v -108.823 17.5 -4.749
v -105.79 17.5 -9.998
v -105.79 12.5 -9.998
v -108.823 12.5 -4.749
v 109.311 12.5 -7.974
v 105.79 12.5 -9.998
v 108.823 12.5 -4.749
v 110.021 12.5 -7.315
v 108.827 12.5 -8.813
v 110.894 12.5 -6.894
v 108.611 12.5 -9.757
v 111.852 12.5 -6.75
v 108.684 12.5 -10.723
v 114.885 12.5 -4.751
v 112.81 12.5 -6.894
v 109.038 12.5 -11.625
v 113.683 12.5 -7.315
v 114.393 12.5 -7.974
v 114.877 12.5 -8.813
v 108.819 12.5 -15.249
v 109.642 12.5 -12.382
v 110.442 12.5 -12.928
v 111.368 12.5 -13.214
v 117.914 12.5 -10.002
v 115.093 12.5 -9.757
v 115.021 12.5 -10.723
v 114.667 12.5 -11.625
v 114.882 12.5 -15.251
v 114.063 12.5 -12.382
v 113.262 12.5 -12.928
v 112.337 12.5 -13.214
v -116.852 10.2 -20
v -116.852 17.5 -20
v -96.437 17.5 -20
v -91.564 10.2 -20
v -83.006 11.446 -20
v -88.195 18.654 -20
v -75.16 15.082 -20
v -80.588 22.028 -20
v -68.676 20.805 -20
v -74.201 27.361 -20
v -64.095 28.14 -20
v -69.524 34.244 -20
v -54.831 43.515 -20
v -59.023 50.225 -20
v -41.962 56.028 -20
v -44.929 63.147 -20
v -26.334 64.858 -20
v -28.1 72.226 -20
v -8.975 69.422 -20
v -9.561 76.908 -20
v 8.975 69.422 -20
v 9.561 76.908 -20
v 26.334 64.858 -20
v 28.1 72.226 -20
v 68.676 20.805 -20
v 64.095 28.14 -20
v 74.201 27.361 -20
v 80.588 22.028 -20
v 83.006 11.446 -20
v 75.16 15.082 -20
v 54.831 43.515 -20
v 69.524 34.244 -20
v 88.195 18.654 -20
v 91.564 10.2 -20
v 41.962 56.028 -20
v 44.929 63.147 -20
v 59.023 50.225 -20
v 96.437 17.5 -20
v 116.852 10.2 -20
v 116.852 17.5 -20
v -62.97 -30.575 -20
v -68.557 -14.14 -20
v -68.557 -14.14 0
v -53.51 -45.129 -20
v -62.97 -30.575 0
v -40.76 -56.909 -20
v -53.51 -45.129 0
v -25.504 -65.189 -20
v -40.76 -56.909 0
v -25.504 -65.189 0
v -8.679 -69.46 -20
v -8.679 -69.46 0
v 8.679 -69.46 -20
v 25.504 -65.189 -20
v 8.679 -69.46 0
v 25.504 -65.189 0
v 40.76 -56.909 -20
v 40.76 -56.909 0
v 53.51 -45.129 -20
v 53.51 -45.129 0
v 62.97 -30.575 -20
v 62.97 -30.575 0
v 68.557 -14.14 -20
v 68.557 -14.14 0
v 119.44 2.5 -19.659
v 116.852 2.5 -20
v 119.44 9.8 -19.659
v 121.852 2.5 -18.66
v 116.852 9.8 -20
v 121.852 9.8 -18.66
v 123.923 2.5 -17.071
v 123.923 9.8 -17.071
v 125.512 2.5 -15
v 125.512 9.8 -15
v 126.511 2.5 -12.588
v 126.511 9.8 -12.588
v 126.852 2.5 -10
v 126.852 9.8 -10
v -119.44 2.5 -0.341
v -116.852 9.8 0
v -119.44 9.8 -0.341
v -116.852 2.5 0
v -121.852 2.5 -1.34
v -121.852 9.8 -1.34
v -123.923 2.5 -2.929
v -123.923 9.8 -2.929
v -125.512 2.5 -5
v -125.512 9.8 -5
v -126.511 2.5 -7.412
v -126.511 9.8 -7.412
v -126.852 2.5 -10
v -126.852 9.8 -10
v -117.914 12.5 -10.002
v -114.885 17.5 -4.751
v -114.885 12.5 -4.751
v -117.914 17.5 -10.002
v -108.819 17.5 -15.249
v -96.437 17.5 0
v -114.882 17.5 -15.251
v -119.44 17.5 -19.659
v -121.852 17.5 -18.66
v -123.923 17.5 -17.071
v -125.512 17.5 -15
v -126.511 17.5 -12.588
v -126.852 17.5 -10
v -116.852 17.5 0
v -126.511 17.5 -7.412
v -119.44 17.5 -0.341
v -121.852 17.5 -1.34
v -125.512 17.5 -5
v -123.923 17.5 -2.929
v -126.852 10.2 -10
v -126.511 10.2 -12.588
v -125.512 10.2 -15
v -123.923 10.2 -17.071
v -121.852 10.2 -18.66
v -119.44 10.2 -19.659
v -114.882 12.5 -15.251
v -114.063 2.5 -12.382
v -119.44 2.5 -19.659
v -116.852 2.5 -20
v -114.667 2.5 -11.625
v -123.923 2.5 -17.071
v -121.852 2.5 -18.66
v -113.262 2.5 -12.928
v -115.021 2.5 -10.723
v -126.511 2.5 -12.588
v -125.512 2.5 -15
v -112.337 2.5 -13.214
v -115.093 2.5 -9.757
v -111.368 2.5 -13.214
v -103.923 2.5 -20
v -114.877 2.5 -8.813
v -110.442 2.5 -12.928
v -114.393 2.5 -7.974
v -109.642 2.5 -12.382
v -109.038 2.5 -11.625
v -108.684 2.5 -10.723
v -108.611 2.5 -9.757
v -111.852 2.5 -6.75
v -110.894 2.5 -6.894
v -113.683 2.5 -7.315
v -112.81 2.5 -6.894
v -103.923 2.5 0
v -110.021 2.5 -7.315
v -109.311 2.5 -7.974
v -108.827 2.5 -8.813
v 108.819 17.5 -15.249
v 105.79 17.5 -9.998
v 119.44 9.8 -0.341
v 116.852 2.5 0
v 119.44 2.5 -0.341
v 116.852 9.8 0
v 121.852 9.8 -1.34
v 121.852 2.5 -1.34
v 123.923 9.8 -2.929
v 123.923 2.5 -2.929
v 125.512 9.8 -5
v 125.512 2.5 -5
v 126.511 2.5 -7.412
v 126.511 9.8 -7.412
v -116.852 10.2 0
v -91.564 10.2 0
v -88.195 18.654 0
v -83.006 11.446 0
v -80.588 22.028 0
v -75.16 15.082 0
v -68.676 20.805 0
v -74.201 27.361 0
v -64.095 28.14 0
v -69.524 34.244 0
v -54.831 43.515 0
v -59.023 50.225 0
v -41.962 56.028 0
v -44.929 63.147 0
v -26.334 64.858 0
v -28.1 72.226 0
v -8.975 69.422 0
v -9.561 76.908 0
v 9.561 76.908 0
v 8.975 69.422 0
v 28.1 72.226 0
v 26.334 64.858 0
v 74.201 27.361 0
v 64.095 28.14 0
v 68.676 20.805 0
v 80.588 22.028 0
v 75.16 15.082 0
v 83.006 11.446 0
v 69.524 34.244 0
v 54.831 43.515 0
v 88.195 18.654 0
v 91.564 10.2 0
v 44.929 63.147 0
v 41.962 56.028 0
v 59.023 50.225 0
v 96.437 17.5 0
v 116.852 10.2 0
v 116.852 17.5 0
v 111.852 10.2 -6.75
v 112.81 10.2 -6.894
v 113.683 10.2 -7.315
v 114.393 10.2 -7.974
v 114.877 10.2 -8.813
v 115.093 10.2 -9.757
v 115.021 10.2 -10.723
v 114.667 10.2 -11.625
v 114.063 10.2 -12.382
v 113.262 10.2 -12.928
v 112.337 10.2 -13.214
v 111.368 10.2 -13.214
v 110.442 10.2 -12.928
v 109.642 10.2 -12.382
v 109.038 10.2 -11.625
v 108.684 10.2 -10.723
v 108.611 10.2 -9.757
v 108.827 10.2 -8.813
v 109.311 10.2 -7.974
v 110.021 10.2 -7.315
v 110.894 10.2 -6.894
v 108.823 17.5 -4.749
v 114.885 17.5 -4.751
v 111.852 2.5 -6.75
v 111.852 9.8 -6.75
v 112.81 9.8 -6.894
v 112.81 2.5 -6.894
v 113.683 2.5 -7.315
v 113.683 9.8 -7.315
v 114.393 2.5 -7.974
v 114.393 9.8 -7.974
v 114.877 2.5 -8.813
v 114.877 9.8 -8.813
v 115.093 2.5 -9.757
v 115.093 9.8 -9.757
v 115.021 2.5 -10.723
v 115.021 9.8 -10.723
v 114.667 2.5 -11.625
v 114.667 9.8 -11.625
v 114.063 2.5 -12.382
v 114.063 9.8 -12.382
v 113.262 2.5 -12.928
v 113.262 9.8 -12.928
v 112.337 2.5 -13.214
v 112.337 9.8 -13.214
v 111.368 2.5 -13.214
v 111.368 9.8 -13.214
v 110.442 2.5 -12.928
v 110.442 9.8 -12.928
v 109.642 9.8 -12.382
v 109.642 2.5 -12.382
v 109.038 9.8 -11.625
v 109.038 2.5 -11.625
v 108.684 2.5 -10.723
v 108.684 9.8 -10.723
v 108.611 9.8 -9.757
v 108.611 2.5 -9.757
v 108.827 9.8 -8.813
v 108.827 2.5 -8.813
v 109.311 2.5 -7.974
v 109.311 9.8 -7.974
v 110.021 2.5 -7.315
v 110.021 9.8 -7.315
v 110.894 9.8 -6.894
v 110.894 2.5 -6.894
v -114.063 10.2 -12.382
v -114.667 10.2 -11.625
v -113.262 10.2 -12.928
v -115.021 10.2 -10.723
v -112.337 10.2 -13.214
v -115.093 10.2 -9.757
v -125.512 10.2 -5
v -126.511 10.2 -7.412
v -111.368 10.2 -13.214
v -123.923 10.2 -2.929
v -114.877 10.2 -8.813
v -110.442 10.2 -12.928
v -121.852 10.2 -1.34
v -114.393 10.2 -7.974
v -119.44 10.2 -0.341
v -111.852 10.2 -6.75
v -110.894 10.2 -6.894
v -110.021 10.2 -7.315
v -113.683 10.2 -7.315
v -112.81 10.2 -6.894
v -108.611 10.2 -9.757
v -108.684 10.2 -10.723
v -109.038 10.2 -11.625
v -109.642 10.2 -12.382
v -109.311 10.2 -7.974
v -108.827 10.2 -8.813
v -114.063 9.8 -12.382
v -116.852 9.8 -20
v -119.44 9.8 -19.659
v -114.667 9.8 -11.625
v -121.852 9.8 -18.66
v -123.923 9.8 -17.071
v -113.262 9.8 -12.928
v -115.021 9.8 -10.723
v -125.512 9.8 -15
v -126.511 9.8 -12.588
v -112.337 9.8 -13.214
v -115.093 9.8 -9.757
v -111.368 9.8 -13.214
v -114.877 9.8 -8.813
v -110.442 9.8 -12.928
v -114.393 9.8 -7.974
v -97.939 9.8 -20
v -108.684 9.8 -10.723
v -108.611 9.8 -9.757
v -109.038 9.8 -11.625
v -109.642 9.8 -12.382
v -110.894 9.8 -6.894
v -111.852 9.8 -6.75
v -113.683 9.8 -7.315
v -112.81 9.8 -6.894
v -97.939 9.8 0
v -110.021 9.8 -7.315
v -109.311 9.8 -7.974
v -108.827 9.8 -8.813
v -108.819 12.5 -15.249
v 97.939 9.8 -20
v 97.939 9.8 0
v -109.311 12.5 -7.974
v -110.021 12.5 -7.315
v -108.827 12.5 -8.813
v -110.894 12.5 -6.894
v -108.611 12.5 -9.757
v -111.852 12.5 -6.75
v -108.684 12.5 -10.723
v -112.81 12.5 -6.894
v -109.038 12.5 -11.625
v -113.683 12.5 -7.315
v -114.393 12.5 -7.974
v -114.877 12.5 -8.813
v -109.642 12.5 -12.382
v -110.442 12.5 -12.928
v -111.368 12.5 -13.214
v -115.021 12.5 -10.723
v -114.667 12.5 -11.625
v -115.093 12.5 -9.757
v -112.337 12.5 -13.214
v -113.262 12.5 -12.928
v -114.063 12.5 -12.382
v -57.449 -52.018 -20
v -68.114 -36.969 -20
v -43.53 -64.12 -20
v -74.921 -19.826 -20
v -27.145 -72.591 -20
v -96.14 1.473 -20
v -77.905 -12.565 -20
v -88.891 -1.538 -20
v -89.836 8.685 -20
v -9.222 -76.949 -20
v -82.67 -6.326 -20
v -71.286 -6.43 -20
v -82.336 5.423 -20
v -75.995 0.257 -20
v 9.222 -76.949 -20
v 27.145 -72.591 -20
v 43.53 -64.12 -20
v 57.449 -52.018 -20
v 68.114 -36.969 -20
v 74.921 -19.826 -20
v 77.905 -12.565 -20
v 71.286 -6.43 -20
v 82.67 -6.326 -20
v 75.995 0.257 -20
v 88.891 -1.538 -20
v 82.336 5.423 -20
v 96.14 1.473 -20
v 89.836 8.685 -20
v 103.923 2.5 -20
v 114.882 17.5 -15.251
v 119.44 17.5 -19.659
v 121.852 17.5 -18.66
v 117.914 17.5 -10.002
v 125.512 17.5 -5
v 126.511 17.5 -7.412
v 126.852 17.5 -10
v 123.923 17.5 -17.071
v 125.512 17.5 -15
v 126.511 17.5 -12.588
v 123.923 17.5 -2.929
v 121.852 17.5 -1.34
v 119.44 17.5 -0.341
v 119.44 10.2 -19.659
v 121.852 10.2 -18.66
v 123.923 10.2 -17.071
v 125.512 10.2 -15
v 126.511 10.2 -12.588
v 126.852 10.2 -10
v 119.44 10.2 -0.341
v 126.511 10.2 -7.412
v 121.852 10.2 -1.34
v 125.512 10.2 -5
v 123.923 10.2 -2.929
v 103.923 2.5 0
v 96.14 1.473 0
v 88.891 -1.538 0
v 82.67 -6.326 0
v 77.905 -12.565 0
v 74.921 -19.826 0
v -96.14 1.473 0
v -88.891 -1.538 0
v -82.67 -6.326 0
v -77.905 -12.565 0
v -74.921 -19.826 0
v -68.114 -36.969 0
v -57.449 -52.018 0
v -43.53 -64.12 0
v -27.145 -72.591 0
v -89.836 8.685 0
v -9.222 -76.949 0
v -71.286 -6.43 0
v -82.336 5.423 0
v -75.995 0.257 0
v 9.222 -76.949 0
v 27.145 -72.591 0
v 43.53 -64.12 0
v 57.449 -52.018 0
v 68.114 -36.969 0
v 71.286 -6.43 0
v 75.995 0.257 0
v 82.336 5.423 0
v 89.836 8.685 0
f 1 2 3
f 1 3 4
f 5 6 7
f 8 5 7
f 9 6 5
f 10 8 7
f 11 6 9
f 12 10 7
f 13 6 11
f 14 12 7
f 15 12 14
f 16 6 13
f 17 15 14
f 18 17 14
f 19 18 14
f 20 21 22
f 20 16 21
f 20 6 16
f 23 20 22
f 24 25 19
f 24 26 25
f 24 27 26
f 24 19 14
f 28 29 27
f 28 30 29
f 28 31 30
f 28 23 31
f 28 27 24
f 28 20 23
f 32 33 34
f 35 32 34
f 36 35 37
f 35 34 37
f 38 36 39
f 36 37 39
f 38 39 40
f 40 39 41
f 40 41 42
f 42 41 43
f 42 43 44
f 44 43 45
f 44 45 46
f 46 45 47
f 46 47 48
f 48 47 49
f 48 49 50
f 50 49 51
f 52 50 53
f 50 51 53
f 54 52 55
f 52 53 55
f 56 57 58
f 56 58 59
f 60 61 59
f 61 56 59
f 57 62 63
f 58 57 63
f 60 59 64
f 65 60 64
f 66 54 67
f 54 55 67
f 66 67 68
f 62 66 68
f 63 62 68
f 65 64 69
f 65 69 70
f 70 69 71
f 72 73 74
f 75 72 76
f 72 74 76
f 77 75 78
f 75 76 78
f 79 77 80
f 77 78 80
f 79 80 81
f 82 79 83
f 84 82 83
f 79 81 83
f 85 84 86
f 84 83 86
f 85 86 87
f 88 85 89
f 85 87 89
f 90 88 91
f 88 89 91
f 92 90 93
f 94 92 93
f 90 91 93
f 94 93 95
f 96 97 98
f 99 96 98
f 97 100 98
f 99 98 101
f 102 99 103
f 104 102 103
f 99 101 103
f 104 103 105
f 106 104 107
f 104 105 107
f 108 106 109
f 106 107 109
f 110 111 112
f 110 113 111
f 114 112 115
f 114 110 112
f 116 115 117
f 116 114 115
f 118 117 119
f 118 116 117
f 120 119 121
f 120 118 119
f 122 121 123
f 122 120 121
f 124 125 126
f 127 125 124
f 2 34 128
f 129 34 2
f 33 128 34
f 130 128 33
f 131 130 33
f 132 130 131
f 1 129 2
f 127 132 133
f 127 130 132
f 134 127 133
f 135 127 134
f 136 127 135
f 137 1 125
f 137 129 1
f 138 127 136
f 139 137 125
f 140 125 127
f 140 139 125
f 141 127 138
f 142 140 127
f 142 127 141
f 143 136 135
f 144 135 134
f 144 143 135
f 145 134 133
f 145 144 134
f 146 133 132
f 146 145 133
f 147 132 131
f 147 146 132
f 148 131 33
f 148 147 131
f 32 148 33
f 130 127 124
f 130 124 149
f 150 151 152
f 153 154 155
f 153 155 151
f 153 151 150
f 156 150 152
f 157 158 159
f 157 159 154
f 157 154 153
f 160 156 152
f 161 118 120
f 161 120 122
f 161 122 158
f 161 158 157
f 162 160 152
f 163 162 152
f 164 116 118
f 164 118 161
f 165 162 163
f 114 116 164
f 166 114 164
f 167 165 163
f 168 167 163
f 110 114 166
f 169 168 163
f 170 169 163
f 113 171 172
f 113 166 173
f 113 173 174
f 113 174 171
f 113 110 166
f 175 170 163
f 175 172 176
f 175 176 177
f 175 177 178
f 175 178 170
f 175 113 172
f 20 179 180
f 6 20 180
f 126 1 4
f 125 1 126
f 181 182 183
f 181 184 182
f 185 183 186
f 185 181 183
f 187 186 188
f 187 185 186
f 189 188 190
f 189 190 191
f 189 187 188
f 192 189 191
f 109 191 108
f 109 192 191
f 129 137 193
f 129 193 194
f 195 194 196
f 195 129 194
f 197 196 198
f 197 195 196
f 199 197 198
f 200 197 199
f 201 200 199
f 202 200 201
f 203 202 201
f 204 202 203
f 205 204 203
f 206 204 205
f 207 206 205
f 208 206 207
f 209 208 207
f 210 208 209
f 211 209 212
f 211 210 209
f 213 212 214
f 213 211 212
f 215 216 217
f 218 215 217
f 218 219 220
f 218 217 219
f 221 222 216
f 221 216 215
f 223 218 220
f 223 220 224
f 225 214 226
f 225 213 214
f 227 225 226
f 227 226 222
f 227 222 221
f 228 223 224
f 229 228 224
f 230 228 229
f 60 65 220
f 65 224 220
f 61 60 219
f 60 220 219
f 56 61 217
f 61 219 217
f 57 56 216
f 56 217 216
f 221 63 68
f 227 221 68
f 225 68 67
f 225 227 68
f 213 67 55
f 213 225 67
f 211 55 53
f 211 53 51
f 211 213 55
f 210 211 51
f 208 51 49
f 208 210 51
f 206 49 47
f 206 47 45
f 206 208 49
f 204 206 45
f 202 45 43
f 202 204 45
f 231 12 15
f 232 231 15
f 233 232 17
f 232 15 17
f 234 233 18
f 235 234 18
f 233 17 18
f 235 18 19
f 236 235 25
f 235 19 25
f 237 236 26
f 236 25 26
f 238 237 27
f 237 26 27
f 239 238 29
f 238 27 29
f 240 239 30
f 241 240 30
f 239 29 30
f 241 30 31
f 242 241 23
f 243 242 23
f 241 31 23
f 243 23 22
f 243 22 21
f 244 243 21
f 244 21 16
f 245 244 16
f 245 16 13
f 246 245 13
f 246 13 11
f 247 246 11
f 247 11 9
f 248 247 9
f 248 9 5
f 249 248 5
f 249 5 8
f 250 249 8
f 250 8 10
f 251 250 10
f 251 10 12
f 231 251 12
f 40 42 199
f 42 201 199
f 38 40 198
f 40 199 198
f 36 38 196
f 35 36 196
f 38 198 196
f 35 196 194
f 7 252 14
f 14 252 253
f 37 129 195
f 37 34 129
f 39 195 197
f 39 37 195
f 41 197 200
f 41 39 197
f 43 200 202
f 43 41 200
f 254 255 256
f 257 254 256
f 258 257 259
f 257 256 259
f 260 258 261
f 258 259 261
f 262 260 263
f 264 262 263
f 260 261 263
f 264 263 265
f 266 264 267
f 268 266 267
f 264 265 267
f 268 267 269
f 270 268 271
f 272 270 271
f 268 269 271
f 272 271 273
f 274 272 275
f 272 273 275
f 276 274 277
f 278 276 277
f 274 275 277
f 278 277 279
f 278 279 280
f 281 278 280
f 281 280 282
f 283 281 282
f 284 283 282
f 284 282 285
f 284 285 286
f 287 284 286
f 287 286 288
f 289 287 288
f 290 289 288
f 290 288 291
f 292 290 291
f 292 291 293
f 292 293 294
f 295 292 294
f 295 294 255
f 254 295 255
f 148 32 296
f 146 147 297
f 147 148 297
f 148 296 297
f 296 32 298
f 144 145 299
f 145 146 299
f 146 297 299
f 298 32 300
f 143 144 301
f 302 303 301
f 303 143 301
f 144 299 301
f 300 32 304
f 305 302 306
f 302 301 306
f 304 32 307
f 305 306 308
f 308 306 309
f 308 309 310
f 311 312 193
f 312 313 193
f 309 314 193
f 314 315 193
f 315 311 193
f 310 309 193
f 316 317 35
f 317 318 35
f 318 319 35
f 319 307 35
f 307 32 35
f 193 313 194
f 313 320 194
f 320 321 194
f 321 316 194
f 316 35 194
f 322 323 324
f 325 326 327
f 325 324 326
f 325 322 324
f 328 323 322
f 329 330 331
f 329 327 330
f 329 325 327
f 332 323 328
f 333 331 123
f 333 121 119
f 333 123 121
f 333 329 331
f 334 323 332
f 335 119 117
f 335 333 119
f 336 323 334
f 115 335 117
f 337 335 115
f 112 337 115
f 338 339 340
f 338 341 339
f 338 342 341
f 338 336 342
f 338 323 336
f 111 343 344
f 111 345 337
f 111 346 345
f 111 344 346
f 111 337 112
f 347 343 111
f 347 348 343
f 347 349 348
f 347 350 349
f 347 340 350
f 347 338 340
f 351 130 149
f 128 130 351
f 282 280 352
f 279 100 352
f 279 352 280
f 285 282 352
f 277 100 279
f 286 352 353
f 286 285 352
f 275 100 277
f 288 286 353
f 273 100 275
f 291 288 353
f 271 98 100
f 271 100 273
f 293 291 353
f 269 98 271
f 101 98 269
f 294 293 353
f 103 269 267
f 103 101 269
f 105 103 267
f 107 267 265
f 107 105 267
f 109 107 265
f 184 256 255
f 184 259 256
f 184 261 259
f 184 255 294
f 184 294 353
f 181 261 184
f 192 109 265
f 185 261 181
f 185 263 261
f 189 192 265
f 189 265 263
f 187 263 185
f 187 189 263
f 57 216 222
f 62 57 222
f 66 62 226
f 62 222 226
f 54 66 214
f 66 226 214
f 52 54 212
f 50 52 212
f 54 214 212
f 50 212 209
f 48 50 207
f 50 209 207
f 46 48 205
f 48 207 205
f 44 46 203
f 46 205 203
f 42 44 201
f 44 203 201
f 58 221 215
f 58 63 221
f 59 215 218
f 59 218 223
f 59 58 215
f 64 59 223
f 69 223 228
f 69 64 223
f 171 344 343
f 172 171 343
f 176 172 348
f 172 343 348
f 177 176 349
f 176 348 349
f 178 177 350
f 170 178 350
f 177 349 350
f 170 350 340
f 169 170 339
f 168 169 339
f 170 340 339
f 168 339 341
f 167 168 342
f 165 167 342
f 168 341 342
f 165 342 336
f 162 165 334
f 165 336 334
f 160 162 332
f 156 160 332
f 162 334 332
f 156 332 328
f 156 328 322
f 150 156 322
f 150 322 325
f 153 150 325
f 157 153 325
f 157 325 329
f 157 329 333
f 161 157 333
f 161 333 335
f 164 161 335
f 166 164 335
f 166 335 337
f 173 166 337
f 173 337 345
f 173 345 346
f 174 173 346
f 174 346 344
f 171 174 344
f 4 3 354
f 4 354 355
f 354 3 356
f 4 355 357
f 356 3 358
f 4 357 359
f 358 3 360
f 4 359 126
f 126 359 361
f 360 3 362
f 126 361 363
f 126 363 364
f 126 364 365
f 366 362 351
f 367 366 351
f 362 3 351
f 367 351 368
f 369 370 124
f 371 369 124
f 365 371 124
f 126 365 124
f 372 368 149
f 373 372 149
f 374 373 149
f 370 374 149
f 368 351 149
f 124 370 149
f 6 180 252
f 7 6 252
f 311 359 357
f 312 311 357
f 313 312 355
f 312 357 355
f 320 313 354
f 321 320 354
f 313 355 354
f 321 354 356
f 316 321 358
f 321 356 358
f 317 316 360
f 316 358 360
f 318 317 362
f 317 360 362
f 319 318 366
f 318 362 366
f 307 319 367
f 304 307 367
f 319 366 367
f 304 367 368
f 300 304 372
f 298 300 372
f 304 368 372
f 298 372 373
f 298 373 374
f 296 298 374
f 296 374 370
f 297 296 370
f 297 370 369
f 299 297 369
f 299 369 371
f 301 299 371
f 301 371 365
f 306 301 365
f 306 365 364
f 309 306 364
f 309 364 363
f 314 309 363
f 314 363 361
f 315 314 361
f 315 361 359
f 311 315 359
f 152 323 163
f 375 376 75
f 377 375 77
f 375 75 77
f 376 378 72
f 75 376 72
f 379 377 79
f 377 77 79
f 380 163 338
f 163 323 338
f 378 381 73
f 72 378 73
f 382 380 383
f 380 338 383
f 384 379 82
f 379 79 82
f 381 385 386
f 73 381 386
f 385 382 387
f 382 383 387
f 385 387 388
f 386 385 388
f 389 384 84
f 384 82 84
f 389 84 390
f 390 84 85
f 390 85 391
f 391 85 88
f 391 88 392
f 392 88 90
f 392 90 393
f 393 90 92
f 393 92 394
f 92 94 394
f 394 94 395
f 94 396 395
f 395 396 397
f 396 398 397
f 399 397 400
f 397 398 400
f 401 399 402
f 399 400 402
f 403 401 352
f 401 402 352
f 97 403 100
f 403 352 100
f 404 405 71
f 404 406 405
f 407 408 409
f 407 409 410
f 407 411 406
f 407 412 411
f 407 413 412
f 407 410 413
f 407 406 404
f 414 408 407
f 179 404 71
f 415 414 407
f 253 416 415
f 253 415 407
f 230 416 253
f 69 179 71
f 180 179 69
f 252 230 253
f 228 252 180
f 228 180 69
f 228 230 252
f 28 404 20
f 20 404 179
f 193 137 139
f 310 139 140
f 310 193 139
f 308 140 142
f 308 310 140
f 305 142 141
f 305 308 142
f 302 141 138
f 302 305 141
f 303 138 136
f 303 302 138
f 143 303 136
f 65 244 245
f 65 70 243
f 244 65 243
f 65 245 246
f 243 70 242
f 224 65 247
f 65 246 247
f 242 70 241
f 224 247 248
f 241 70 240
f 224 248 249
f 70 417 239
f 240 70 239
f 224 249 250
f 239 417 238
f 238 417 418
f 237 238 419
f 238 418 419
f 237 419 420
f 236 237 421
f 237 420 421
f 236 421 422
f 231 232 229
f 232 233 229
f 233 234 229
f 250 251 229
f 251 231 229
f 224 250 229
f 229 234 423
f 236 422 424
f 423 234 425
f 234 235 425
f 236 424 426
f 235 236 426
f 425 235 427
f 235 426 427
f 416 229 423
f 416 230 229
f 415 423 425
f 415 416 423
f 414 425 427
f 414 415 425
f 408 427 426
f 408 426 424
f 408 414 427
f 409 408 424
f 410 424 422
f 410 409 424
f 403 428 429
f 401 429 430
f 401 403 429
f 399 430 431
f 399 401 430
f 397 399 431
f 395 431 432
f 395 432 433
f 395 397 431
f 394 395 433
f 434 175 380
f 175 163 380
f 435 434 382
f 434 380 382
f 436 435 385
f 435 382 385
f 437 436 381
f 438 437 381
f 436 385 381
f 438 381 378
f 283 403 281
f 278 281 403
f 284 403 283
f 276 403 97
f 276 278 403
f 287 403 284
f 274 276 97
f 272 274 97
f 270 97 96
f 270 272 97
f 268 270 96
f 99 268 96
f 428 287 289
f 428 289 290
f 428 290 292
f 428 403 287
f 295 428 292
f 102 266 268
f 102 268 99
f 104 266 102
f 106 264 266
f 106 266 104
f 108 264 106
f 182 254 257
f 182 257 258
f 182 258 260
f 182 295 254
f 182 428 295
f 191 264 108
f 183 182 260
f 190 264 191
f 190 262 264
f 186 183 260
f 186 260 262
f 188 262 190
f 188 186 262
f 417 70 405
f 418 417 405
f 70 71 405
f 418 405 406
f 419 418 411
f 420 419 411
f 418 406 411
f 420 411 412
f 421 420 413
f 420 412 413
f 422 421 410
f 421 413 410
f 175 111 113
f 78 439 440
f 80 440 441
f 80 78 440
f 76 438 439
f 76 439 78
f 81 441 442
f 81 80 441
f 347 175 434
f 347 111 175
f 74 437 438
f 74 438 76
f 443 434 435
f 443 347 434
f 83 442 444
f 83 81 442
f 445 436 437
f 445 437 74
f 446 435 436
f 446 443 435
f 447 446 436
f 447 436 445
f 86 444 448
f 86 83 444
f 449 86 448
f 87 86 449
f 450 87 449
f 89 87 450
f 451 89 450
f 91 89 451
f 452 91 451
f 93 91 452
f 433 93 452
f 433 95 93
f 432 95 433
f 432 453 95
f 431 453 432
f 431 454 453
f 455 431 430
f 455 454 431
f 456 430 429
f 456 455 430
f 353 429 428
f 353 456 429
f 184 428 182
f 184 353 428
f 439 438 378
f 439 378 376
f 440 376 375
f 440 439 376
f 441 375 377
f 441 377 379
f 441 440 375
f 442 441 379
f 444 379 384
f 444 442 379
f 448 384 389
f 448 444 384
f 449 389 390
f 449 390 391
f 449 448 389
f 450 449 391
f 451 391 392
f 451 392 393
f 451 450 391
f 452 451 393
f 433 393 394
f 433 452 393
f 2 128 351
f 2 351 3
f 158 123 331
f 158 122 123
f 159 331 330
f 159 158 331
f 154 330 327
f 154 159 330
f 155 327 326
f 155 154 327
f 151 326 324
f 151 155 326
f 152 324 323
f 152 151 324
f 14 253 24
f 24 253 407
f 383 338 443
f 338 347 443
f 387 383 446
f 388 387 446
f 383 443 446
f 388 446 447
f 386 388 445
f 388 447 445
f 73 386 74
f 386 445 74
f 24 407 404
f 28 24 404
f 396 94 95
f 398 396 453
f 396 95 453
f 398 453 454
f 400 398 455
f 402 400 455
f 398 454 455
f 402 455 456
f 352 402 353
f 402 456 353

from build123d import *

# Parameters (mm, degrees)
SKETCH2_R               = 70
BOSS_EXTRUDE1_DEPTH     = 20
CUT_EXTRUDE1_DEPTH      = 267.030265755
CUT_EXTRUDE1_DEPTH_BACK = 267.030265755
SKETCH4_W               = 20
SKETCH4_H               = 0.4
FILLET1_R               = 30
FILLET2_R               = 30
FILLET3_R               = 10
FILLET4_R               = 10
CUT_EXTRUDE2_DEPTH      = 5
SKETCH6_R               = 3.25
CUT_EXTRUDE3_DEPTH      = 160.738733795


with BuildPart() as part:
    # Sketch2 → Boss-Extrude1 (new body)
    with BuildSketch(Plane.XY):
        with BuildLine():
            Line((-126.852130745, 2.5), (-77.459666924, 2.5))
            ThreePointArc((-77.459666924, 2.5), (0, -77.5), (77.459666924, 2.5))
            Line((77.459666924, 2.5), (126.852130745, 2.5))
            Line((126.852130745, 2.5), (126.852130745, 17.5))
            Line((126.852130745, 17.5), (75.498344353, 17.5))
            ThreePointArc((75.498344353, 17.5), (0, 77.5), (-75.498344353, 17.5))
            Line((-75.498344353, 17.5), (-126.852130745, 17.5))
            Line((-126.852130745, 17.5), (-126.852130745, 2.5))
        make_face()
        Circle(SKETCH2_R, mode=Mode.SUBTRACT)
    extrude(amount=-BOSS_EXTRUDE1_DEPTH)

    # Sketch4 → Cut-Extrude1 (cut, two sides: drawn at the far end of the back side and taken through both)
    with BuildSketch(Plane.ZY.offset(126.852130745).offset(-CUT_EXTRUDE1_DEPTH_BACK)):
        with Locations((-10, 10)):
            Rectangle(SKETCH4_W, SKETCH4_H)
    extrude(amount=CUT_EXTRUDE1_DEPTH + CUT_EXTRUDE1_DEPTH_BACK, mode=Mode.SUBTRACT)


with BuildPart() as cut_extrude1_piece_1:
    # of the separate pieces the step leaves, piece 1, a body of its own (cut_extrude1_pieces)
    add(part.part.solids().sort_by_distance((-126.852130745, 9.8, 0))[0])

    # Fillet2
    fillet2_edges = [cut_extrude1_piece_1.edges().sort_by_distance(p)[0] for p in [
        (77.459666924, 2.5, -10),
        (-77.459666924, 2.5, -10),
        (-69.310605249, 9.8, -10),
        (69.310605249, 9.8, -10),
    ]]
    fillet(fillet2_edges, radius=FILLET2_R)

    # Fillet4
    fillet4_edges = [cut_extrude1_piece_1.edges().sort_by_distance(p)[0] for p in [
        (126.852130745, 6.15, 0),
        (126.852130745, 6.15, -20),
        (-126.852130745, 6.15, 0),
        (-126.852130745, 6.15, -20),
    ]]
    fillet(fillet4_edges, radius=FILLET4_R - 0.0001)  # a hair under: the kernel refuses the full size


with BuildPart() as cut_extrude1_piece_2:
    # of the separate pieces the step leaves, piece 2, a body of its own (cut_extrude1_pieces)
    add(part.part.solids().sort_by_distance((-75.498344353, 17.5, 0))[0])

    # Fillet1
    fillet1_edges = [cut_extrude1_piece_2.edges().sort_by_distance(p)[0] for p in [
        (-75.498344353, 17.5, -10),
        (75.498344353, 17.5, -10),
        (69.252869977, 10.2, -10),
        (-69.252869977, 10.2, -10),
    ]]
    fillet(fillet1_edges, radius=FILLET1_R)

    # Fillet3
    fillet3_edges = [cut_extrude1_piece_2.edges().sort_by_distance(p)[0] for p in [
        (-126.852130745, 13.85, 0),
        (-126.852130745, 13.85, -20),
        (126.852130745, 13.85, 0),
        (126.852130745, 13.85, -20),
    ]]
    fillet(fillet3_edges, radius=FILLET3_R - 0.0001)  # a hair under: the kernel refuses the full size

    # Sketch5 → Cut-Extrude2 (cut)
    with BuildSketch(Plane(origin=(0, 17.5, 0), x_dir=(1, 0, 0), z_dir=(0, 1, 0))):
        Polygon((-117.914308268, 10.001916974), (-114.881559358, 15.250958224), (-108.819381835, 15.249041251), (-105.789953221, 9.998083026), (-108.822702131, 4.749041776), (-114.884879654, 4.750958749), align=None)
        Polygon((114.881559358, 15.250958224), (108.819381835, 15.249041251), (105.789953221, 9.998083026), (108.822702131, 4.749041776), (114.884879654, 4.750958749), (117.914308268, 10.001916974), align=None)
    extrude(amount=-CUT_EXTRUDE2_DEPTH, mode=Mode.SUBTRACT)


with BuildPart() as cut_extrude3_tool:
    # Sketch6 → Cut-Extrude3 (new, through all)
    with BuildSketch(Plane(origin=(0, 17.5, 0), x_dir=(1, 0, 0), z_dir=(0, 1, 0))):
        with Locations(Location((-111.852130745, 10, 0), (0, 0, 270))):
            Circle(SKETCH6_R)
        with Locations(Location((111.852130745, 10, 0), (0, 0, 270))):
            Circle(SKETCH6_R)
    extrude(amount=-CUT_EXTRUDE3_DEPTH)


with BuildPart() as cut_extrude1_piece_1_1:
    add(cut_extrude1_piece_1.part)

    # Cut-Extrude3: cut by cut_extrude3_tool
    add(cut_extrude3_tool.part, mode=Mode.SUBTRACT)


with BuildPart() as cut_extrude1_piece_2_1:
    add(cut_extrude1_piece_2.part)

    # Cut-Extrude3: cut by cut_extrude3_tool
    add(cut_extrude3_tool.part, mode=Mode.SUBTRACT)


solid = Compound([cut_extrude1_piece_1_1.part, cut_extrude1_piece_2_1.part])
